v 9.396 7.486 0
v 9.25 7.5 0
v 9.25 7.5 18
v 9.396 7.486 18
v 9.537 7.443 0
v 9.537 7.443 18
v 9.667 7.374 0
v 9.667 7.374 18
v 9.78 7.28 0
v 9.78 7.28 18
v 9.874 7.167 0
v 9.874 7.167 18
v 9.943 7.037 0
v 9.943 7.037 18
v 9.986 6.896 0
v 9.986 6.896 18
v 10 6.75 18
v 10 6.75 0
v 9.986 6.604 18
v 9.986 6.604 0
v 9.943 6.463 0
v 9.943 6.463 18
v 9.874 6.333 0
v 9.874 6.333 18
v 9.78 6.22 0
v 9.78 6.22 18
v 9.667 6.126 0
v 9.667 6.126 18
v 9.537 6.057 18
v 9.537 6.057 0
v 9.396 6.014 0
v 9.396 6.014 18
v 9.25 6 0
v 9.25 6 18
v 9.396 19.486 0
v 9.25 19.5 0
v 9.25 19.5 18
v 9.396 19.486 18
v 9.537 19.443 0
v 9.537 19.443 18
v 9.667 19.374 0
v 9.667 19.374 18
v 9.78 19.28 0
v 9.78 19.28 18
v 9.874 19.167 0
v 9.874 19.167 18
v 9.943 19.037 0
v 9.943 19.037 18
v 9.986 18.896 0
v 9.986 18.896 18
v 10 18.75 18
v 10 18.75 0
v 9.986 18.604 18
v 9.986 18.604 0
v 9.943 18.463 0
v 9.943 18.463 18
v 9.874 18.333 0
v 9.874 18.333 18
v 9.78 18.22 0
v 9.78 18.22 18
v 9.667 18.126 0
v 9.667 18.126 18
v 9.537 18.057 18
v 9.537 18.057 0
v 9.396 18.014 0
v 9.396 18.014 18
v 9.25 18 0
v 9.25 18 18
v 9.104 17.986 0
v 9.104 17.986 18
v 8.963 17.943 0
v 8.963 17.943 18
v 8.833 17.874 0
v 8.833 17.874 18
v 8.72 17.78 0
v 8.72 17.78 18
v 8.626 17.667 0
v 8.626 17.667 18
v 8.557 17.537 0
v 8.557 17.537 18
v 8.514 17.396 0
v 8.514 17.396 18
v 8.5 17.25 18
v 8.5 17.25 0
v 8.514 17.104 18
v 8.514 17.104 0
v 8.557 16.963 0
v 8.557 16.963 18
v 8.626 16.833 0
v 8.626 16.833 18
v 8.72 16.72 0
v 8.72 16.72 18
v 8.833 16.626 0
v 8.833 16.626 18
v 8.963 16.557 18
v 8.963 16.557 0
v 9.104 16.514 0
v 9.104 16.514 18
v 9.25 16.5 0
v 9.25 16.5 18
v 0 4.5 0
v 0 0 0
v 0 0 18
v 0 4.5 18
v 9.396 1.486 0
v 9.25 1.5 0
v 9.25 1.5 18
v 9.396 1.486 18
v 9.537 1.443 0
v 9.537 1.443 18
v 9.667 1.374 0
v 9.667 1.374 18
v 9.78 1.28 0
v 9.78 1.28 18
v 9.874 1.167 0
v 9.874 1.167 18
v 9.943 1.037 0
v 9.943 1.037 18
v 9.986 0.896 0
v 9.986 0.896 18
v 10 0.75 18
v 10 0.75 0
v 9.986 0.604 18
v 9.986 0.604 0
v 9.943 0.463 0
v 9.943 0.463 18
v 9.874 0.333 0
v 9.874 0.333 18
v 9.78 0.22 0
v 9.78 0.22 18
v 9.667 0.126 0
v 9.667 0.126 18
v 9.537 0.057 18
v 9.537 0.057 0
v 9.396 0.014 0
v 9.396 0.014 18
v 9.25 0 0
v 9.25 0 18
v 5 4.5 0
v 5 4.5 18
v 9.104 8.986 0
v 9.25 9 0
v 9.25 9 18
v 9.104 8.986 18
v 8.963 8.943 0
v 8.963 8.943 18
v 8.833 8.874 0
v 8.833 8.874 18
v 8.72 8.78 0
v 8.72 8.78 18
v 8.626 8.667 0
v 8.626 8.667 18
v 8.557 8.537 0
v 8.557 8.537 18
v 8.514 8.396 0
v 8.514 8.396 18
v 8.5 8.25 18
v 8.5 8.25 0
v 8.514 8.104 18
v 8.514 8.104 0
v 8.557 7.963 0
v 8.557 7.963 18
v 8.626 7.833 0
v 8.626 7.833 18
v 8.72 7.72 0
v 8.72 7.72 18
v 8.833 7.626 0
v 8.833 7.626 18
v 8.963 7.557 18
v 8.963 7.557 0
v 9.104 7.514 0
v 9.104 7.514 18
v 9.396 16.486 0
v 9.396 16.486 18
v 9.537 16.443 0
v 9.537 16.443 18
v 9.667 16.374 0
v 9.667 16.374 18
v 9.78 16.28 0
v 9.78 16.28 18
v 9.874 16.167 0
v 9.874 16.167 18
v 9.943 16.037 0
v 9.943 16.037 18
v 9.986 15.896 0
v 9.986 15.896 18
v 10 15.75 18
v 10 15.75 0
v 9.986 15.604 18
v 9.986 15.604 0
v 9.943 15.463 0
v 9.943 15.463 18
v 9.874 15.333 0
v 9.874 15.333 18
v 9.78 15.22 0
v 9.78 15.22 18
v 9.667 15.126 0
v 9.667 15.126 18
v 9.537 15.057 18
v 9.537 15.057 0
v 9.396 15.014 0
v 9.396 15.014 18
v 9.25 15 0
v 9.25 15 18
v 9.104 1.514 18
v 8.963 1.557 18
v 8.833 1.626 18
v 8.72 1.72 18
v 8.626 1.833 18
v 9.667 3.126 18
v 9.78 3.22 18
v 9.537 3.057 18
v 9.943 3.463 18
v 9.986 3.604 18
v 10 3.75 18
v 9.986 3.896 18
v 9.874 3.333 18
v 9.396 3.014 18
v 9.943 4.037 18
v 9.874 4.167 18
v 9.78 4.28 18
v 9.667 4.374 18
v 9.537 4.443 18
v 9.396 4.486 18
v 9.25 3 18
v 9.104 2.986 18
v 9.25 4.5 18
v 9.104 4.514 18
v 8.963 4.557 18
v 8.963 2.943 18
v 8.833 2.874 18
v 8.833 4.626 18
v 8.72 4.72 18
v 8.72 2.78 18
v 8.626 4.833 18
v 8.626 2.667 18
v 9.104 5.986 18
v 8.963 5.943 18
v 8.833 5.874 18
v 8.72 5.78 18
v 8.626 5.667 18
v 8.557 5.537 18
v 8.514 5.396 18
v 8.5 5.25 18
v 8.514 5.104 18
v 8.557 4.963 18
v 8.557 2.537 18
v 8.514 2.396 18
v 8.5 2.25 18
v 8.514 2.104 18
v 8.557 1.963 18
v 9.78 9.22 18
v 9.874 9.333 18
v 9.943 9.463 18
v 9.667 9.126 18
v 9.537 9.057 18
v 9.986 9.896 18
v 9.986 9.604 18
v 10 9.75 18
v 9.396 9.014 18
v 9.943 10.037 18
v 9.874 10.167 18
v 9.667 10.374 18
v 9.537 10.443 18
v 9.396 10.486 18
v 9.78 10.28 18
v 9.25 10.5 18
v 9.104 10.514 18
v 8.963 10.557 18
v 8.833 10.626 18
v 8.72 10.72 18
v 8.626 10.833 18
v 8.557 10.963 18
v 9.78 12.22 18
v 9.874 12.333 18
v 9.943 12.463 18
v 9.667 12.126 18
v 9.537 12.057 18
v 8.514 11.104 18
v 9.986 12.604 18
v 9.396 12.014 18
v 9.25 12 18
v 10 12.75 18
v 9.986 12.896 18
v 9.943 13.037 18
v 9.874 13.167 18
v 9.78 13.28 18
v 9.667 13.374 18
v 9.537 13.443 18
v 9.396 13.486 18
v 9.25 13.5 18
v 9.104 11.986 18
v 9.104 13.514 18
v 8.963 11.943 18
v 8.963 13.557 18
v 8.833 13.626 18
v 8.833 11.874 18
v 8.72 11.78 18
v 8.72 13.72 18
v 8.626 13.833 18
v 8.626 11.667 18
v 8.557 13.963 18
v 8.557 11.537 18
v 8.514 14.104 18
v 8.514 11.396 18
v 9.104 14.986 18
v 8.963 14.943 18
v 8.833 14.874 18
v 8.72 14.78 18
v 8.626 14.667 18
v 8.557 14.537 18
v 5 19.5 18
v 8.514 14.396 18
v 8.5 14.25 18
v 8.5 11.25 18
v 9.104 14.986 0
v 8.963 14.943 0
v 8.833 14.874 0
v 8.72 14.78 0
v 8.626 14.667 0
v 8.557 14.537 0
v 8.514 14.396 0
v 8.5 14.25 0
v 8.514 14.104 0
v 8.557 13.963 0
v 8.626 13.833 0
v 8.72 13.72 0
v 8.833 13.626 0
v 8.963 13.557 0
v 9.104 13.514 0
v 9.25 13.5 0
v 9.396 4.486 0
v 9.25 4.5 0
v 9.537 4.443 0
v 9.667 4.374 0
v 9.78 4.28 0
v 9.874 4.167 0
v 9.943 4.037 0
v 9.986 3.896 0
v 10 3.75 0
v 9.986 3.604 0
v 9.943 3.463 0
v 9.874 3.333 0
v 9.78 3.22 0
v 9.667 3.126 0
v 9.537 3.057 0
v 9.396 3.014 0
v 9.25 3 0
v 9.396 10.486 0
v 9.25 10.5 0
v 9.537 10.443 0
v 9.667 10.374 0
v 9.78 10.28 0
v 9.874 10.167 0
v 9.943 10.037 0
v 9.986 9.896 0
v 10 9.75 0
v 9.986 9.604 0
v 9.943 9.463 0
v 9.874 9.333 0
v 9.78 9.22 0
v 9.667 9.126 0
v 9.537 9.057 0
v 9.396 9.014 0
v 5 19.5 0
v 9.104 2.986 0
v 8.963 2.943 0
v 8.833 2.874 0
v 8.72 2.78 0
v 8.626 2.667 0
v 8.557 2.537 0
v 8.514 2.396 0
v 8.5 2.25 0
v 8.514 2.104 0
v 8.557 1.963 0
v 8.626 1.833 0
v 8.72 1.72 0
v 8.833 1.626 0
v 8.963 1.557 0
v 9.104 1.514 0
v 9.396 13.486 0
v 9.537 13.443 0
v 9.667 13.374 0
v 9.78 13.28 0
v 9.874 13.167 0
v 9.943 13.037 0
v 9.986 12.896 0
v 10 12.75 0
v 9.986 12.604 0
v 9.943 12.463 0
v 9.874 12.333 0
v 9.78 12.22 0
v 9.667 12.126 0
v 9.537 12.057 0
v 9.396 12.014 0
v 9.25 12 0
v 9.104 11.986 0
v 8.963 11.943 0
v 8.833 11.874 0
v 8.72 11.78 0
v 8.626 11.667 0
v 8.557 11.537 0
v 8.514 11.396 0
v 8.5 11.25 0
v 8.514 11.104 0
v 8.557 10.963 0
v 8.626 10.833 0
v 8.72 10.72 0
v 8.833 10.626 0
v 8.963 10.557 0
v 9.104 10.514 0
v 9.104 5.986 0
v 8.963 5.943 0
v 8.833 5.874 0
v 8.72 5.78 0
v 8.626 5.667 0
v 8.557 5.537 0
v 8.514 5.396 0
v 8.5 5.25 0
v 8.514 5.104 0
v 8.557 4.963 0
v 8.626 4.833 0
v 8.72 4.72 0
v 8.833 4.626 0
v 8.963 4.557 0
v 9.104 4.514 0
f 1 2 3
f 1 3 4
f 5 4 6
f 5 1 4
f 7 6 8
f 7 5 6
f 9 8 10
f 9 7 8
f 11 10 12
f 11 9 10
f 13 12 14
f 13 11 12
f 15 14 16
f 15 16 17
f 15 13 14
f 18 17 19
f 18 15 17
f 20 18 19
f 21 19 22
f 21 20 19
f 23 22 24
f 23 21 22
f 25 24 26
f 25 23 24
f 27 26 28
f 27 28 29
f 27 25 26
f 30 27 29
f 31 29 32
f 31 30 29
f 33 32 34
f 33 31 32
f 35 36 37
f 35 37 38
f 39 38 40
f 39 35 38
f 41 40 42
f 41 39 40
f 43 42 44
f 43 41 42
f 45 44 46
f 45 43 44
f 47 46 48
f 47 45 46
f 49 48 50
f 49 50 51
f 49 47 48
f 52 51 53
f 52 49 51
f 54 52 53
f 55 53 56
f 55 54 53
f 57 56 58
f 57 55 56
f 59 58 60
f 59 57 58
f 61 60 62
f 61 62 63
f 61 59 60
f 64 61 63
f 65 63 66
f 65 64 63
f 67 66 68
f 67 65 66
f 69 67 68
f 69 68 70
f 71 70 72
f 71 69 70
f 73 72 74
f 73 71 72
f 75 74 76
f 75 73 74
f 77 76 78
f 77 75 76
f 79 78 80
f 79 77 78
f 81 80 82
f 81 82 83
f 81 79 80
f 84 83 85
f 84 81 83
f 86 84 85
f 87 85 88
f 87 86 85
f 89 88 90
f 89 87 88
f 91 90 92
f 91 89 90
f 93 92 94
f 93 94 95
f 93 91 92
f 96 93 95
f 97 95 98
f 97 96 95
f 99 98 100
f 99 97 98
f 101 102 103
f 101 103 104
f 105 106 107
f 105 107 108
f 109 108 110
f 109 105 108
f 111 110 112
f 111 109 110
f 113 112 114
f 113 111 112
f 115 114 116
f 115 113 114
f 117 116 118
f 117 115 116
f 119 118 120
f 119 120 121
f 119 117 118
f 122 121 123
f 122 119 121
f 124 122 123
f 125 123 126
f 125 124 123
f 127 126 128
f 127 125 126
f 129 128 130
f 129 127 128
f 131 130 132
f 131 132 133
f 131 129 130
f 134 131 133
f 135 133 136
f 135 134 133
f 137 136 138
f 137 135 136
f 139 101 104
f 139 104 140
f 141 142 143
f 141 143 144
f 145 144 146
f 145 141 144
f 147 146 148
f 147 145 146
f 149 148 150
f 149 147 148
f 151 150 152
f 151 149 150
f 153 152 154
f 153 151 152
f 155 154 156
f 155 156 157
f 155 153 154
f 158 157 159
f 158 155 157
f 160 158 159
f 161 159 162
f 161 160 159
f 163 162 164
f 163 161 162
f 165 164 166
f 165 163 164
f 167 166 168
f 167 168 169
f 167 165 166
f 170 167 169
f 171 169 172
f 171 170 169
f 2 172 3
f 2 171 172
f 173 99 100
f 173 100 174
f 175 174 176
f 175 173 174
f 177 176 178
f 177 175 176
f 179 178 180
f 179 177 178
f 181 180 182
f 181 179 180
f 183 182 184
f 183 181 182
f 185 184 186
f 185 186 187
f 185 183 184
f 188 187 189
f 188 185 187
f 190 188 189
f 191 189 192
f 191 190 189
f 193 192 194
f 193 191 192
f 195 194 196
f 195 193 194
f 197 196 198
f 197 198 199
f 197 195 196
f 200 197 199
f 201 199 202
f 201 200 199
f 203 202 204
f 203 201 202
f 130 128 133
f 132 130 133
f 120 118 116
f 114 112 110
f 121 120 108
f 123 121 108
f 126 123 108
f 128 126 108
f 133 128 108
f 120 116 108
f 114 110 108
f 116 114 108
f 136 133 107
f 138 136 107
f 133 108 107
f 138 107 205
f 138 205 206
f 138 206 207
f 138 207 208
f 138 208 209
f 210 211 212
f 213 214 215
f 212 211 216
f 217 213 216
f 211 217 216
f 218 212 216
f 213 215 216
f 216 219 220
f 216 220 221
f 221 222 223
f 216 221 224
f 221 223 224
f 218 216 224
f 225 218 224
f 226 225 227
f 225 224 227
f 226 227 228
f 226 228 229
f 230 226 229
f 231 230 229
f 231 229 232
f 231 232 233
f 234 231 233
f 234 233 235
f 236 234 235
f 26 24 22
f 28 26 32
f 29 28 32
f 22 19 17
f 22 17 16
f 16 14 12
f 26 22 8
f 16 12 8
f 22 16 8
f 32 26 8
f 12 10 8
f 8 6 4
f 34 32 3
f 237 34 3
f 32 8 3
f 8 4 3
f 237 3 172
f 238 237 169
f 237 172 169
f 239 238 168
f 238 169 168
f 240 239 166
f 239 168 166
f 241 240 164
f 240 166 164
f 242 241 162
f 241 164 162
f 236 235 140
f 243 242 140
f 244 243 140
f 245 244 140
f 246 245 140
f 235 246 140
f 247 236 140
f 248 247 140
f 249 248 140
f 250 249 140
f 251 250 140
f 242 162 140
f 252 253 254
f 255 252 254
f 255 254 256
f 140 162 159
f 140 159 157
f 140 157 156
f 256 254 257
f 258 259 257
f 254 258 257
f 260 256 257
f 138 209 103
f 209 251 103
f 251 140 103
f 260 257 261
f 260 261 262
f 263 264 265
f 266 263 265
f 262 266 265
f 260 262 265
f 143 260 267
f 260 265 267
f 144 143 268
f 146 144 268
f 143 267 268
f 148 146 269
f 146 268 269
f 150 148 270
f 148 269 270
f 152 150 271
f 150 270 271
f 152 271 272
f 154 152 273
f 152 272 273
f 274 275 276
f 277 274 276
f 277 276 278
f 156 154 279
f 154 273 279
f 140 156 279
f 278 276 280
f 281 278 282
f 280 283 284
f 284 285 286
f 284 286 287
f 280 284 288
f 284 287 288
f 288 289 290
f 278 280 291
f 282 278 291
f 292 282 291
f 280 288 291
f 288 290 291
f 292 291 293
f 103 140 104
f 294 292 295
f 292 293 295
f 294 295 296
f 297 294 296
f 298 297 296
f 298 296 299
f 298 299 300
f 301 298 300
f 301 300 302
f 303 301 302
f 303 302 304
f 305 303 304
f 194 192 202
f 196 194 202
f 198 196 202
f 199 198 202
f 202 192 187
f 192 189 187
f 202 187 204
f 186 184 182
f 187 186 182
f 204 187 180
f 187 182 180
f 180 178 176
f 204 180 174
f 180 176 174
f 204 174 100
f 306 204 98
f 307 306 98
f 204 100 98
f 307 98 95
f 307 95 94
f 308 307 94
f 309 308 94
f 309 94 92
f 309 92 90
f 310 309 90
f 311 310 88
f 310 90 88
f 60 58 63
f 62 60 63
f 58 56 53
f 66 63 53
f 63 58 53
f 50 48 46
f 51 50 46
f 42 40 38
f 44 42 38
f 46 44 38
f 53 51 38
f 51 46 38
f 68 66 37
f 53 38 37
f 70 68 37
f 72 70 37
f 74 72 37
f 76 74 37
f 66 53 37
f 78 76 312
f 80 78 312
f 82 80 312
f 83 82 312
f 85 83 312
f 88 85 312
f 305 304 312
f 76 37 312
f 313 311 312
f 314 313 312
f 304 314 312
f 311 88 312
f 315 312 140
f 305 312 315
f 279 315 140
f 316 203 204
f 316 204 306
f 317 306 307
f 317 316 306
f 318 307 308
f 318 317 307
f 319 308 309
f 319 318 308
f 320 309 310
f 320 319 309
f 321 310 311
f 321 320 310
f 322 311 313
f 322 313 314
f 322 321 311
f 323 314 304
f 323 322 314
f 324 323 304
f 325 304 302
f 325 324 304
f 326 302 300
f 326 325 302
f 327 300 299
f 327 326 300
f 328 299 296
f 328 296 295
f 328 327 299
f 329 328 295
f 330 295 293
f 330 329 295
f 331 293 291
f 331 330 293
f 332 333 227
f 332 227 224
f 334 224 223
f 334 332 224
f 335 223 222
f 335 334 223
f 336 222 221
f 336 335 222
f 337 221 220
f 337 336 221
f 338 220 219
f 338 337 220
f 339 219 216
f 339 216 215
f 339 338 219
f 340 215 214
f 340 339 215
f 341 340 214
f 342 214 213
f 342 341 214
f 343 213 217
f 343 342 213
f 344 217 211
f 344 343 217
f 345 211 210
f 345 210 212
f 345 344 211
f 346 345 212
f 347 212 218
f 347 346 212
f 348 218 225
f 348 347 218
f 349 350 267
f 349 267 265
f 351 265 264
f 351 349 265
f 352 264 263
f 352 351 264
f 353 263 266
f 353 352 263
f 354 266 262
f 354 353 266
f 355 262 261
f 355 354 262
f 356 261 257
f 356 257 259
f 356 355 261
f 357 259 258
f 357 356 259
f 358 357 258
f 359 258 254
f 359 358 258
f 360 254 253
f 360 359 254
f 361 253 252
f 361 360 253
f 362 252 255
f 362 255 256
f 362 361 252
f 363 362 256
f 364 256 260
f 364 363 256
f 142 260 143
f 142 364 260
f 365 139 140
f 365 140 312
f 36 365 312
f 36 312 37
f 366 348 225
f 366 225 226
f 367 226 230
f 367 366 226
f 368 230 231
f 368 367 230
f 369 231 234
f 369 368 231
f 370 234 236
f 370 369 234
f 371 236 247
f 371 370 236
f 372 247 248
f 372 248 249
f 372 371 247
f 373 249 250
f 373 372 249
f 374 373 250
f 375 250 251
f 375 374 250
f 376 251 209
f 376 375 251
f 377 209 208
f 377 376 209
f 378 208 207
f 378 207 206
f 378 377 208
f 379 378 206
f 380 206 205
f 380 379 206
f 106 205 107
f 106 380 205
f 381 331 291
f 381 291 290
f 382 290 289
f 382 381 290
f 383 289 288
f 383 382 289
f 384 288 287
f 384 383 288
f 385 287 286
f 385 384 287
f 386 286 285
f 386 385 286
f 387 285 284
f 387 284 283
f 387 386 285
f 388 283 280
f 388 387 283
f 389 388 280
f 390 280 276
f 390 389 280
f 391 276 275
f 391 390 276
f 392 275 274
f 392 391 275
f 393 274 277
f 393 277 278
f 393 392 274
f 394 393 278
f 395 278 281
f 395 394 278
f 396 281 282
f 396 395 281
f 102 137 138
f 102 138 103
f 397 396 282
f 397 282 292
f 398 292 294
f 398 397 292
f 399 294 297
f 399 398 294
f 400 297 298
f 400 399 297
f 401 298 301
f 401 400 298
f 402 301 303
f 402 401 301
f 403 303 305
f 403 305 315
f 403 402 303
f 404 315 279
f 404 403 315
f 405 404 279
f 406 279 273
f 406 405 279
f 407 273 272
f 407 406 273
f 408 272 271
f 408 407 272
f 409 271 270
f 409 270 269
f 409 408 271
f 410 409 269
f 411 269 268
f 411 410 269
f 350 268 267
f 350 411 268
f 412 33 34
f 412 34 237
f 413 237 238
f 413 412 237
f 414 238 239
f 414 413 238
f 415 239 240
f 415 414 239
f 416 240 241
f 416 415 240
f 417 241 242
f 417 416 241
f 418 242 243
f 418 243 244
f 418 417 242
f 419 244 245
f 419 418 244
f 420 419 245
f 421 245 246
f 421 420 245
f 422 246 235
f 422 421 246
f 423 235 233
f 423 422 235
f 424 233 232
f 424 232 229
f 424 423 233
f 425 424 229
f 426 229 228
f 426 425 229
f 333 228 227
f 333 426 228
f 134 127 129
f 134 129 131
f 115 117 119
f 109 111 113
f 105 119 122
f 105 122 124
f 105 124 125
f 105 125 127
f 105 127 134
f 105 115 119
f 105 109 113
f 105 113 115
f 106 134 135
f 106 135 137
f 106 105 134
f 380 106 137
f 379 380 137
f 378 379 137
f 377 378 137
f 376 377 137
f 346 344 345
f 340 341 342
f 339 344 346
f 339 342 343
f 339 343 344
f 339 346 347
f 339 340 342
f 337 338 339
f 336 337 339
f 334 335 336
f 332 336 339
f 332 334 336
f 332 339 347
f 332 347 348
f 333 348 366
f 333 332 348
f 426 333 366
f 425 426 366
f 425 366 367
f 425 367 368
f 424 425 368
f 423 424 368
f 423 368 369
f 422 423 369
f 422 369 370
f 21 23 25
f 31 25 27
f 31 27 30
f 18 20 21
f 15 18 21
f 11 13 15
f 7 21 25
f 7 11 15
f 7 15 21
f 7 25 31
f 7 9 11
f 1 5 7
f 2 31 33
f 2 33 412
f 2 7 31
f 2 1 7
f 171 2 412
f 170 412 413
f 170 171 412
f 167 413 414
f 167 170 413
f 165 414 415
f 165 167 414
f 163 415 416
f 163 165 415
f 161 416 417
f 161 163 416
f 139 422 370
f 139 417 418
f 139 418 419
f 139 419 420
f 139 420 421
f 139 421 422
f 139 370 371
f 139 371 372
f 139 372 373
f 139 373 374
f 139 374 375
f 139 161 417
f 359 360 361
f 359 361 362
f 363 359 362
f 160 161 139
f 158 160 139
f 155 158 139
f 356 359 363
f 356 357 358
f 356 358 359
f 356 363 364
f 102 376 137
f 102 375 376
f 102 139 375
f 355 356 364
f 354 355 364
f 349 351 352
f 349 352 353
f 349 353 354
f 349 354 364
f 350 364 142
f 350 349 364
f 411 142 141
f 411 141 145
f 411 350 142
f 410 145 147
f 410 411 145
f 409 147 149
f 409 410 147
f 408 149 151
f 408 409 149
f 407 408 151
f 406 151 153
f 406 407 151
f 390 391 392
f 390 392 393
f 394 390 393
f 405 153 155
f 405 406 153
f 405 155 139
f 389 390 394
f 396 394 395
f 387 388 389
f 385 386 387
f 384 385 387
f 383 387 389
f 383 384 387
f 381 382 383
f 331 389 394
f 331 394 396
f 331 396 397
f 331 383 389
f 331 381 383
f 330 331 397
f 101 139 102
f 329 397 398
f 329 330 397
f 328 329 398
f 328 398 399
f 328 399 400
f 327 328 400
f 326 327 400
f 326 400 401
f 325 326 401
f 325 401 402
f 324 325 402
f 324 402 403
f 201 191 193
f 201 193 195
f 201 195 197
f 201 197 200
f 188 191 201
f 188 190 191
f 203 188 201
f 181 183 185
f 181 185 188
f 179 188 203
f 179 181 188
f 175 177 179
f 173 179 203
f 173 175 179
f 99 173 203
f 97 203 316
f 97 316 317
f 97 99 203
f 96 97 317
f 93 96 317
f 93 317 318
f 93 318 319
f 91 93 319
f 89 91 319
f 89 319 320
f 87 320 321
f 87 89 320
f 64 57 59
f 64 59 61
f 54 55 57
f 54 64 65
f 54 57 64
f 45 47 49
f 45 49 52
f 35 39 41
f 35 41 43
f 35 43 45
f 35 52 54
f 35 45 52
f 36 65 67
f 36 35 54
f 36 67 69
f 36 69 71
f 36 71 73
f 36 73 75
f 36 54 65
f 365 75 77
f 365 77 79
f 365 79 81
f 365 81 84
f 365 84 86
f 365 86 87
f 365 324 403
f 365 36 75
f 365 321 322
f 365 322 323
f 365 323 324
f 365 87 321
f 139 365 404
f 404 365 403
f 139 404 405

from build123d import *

# Parameters (mm, degrees)
EXTRUDE_1_DEPTH = 18


with BuildPart() as part:
    # 草图1 → 凸台-拉伸1 (new body)
    with BuildSketch(Plane.XY):
        with BuildLine():
            Line((5, 4.5), (5, 19.5))
            Line((5, 19.5), (9.25, 19.5))
            ThreePointArc((9.25, 19.5), (10, 18.75), (9.25, 18))
            ThreePointArc((9.25, 18), (8.5, 17.25), (9.25, 16.5))
            ThreePointArc((9.25, 16.5), (10, 15.75), (9.25, 15))
            ThreePointArc((9.25, 15), (8.5, 14.25), (9.25, 13.5))
            ThreePointArc((9.25, 13.5), (10, 12.75), (9.25, 12))
            ThreePointArc((9.25, 12), (8.5, 11.25), (9.25, 10.5))
            ThreePointArc((9.25, 10.5), (10, 9.75), (9.25, 9))
            ThreePointArc((9.25, 9), (8.5, 8.25), (9.25, 7.5))
            ThreePointArc((9.25, 7.5), (10, 6.75), (9.25, 6))
            ThreePointArc((9.25, 6), (8.5, 5.25), (9.25, 4.5))
            ThreePointArc((9.25, 4.5), (10, 3.75), (9.25, 3))
            ThreePointArc((9.25, 3), (8.5, 2.25), (9.25, 1.5))
            ThreePointArc((9.25, 1.5), (10, 0.75), (9.25, 0))
            Line((9.25, 0), (0, 0))
            Line((0, 0), (0, 4.5))
            Line((0, 4.5), (5, 4.5))
        make_face()
    extrude(amount=EXTRUDE_1_DEPTH)


solid = part.part
